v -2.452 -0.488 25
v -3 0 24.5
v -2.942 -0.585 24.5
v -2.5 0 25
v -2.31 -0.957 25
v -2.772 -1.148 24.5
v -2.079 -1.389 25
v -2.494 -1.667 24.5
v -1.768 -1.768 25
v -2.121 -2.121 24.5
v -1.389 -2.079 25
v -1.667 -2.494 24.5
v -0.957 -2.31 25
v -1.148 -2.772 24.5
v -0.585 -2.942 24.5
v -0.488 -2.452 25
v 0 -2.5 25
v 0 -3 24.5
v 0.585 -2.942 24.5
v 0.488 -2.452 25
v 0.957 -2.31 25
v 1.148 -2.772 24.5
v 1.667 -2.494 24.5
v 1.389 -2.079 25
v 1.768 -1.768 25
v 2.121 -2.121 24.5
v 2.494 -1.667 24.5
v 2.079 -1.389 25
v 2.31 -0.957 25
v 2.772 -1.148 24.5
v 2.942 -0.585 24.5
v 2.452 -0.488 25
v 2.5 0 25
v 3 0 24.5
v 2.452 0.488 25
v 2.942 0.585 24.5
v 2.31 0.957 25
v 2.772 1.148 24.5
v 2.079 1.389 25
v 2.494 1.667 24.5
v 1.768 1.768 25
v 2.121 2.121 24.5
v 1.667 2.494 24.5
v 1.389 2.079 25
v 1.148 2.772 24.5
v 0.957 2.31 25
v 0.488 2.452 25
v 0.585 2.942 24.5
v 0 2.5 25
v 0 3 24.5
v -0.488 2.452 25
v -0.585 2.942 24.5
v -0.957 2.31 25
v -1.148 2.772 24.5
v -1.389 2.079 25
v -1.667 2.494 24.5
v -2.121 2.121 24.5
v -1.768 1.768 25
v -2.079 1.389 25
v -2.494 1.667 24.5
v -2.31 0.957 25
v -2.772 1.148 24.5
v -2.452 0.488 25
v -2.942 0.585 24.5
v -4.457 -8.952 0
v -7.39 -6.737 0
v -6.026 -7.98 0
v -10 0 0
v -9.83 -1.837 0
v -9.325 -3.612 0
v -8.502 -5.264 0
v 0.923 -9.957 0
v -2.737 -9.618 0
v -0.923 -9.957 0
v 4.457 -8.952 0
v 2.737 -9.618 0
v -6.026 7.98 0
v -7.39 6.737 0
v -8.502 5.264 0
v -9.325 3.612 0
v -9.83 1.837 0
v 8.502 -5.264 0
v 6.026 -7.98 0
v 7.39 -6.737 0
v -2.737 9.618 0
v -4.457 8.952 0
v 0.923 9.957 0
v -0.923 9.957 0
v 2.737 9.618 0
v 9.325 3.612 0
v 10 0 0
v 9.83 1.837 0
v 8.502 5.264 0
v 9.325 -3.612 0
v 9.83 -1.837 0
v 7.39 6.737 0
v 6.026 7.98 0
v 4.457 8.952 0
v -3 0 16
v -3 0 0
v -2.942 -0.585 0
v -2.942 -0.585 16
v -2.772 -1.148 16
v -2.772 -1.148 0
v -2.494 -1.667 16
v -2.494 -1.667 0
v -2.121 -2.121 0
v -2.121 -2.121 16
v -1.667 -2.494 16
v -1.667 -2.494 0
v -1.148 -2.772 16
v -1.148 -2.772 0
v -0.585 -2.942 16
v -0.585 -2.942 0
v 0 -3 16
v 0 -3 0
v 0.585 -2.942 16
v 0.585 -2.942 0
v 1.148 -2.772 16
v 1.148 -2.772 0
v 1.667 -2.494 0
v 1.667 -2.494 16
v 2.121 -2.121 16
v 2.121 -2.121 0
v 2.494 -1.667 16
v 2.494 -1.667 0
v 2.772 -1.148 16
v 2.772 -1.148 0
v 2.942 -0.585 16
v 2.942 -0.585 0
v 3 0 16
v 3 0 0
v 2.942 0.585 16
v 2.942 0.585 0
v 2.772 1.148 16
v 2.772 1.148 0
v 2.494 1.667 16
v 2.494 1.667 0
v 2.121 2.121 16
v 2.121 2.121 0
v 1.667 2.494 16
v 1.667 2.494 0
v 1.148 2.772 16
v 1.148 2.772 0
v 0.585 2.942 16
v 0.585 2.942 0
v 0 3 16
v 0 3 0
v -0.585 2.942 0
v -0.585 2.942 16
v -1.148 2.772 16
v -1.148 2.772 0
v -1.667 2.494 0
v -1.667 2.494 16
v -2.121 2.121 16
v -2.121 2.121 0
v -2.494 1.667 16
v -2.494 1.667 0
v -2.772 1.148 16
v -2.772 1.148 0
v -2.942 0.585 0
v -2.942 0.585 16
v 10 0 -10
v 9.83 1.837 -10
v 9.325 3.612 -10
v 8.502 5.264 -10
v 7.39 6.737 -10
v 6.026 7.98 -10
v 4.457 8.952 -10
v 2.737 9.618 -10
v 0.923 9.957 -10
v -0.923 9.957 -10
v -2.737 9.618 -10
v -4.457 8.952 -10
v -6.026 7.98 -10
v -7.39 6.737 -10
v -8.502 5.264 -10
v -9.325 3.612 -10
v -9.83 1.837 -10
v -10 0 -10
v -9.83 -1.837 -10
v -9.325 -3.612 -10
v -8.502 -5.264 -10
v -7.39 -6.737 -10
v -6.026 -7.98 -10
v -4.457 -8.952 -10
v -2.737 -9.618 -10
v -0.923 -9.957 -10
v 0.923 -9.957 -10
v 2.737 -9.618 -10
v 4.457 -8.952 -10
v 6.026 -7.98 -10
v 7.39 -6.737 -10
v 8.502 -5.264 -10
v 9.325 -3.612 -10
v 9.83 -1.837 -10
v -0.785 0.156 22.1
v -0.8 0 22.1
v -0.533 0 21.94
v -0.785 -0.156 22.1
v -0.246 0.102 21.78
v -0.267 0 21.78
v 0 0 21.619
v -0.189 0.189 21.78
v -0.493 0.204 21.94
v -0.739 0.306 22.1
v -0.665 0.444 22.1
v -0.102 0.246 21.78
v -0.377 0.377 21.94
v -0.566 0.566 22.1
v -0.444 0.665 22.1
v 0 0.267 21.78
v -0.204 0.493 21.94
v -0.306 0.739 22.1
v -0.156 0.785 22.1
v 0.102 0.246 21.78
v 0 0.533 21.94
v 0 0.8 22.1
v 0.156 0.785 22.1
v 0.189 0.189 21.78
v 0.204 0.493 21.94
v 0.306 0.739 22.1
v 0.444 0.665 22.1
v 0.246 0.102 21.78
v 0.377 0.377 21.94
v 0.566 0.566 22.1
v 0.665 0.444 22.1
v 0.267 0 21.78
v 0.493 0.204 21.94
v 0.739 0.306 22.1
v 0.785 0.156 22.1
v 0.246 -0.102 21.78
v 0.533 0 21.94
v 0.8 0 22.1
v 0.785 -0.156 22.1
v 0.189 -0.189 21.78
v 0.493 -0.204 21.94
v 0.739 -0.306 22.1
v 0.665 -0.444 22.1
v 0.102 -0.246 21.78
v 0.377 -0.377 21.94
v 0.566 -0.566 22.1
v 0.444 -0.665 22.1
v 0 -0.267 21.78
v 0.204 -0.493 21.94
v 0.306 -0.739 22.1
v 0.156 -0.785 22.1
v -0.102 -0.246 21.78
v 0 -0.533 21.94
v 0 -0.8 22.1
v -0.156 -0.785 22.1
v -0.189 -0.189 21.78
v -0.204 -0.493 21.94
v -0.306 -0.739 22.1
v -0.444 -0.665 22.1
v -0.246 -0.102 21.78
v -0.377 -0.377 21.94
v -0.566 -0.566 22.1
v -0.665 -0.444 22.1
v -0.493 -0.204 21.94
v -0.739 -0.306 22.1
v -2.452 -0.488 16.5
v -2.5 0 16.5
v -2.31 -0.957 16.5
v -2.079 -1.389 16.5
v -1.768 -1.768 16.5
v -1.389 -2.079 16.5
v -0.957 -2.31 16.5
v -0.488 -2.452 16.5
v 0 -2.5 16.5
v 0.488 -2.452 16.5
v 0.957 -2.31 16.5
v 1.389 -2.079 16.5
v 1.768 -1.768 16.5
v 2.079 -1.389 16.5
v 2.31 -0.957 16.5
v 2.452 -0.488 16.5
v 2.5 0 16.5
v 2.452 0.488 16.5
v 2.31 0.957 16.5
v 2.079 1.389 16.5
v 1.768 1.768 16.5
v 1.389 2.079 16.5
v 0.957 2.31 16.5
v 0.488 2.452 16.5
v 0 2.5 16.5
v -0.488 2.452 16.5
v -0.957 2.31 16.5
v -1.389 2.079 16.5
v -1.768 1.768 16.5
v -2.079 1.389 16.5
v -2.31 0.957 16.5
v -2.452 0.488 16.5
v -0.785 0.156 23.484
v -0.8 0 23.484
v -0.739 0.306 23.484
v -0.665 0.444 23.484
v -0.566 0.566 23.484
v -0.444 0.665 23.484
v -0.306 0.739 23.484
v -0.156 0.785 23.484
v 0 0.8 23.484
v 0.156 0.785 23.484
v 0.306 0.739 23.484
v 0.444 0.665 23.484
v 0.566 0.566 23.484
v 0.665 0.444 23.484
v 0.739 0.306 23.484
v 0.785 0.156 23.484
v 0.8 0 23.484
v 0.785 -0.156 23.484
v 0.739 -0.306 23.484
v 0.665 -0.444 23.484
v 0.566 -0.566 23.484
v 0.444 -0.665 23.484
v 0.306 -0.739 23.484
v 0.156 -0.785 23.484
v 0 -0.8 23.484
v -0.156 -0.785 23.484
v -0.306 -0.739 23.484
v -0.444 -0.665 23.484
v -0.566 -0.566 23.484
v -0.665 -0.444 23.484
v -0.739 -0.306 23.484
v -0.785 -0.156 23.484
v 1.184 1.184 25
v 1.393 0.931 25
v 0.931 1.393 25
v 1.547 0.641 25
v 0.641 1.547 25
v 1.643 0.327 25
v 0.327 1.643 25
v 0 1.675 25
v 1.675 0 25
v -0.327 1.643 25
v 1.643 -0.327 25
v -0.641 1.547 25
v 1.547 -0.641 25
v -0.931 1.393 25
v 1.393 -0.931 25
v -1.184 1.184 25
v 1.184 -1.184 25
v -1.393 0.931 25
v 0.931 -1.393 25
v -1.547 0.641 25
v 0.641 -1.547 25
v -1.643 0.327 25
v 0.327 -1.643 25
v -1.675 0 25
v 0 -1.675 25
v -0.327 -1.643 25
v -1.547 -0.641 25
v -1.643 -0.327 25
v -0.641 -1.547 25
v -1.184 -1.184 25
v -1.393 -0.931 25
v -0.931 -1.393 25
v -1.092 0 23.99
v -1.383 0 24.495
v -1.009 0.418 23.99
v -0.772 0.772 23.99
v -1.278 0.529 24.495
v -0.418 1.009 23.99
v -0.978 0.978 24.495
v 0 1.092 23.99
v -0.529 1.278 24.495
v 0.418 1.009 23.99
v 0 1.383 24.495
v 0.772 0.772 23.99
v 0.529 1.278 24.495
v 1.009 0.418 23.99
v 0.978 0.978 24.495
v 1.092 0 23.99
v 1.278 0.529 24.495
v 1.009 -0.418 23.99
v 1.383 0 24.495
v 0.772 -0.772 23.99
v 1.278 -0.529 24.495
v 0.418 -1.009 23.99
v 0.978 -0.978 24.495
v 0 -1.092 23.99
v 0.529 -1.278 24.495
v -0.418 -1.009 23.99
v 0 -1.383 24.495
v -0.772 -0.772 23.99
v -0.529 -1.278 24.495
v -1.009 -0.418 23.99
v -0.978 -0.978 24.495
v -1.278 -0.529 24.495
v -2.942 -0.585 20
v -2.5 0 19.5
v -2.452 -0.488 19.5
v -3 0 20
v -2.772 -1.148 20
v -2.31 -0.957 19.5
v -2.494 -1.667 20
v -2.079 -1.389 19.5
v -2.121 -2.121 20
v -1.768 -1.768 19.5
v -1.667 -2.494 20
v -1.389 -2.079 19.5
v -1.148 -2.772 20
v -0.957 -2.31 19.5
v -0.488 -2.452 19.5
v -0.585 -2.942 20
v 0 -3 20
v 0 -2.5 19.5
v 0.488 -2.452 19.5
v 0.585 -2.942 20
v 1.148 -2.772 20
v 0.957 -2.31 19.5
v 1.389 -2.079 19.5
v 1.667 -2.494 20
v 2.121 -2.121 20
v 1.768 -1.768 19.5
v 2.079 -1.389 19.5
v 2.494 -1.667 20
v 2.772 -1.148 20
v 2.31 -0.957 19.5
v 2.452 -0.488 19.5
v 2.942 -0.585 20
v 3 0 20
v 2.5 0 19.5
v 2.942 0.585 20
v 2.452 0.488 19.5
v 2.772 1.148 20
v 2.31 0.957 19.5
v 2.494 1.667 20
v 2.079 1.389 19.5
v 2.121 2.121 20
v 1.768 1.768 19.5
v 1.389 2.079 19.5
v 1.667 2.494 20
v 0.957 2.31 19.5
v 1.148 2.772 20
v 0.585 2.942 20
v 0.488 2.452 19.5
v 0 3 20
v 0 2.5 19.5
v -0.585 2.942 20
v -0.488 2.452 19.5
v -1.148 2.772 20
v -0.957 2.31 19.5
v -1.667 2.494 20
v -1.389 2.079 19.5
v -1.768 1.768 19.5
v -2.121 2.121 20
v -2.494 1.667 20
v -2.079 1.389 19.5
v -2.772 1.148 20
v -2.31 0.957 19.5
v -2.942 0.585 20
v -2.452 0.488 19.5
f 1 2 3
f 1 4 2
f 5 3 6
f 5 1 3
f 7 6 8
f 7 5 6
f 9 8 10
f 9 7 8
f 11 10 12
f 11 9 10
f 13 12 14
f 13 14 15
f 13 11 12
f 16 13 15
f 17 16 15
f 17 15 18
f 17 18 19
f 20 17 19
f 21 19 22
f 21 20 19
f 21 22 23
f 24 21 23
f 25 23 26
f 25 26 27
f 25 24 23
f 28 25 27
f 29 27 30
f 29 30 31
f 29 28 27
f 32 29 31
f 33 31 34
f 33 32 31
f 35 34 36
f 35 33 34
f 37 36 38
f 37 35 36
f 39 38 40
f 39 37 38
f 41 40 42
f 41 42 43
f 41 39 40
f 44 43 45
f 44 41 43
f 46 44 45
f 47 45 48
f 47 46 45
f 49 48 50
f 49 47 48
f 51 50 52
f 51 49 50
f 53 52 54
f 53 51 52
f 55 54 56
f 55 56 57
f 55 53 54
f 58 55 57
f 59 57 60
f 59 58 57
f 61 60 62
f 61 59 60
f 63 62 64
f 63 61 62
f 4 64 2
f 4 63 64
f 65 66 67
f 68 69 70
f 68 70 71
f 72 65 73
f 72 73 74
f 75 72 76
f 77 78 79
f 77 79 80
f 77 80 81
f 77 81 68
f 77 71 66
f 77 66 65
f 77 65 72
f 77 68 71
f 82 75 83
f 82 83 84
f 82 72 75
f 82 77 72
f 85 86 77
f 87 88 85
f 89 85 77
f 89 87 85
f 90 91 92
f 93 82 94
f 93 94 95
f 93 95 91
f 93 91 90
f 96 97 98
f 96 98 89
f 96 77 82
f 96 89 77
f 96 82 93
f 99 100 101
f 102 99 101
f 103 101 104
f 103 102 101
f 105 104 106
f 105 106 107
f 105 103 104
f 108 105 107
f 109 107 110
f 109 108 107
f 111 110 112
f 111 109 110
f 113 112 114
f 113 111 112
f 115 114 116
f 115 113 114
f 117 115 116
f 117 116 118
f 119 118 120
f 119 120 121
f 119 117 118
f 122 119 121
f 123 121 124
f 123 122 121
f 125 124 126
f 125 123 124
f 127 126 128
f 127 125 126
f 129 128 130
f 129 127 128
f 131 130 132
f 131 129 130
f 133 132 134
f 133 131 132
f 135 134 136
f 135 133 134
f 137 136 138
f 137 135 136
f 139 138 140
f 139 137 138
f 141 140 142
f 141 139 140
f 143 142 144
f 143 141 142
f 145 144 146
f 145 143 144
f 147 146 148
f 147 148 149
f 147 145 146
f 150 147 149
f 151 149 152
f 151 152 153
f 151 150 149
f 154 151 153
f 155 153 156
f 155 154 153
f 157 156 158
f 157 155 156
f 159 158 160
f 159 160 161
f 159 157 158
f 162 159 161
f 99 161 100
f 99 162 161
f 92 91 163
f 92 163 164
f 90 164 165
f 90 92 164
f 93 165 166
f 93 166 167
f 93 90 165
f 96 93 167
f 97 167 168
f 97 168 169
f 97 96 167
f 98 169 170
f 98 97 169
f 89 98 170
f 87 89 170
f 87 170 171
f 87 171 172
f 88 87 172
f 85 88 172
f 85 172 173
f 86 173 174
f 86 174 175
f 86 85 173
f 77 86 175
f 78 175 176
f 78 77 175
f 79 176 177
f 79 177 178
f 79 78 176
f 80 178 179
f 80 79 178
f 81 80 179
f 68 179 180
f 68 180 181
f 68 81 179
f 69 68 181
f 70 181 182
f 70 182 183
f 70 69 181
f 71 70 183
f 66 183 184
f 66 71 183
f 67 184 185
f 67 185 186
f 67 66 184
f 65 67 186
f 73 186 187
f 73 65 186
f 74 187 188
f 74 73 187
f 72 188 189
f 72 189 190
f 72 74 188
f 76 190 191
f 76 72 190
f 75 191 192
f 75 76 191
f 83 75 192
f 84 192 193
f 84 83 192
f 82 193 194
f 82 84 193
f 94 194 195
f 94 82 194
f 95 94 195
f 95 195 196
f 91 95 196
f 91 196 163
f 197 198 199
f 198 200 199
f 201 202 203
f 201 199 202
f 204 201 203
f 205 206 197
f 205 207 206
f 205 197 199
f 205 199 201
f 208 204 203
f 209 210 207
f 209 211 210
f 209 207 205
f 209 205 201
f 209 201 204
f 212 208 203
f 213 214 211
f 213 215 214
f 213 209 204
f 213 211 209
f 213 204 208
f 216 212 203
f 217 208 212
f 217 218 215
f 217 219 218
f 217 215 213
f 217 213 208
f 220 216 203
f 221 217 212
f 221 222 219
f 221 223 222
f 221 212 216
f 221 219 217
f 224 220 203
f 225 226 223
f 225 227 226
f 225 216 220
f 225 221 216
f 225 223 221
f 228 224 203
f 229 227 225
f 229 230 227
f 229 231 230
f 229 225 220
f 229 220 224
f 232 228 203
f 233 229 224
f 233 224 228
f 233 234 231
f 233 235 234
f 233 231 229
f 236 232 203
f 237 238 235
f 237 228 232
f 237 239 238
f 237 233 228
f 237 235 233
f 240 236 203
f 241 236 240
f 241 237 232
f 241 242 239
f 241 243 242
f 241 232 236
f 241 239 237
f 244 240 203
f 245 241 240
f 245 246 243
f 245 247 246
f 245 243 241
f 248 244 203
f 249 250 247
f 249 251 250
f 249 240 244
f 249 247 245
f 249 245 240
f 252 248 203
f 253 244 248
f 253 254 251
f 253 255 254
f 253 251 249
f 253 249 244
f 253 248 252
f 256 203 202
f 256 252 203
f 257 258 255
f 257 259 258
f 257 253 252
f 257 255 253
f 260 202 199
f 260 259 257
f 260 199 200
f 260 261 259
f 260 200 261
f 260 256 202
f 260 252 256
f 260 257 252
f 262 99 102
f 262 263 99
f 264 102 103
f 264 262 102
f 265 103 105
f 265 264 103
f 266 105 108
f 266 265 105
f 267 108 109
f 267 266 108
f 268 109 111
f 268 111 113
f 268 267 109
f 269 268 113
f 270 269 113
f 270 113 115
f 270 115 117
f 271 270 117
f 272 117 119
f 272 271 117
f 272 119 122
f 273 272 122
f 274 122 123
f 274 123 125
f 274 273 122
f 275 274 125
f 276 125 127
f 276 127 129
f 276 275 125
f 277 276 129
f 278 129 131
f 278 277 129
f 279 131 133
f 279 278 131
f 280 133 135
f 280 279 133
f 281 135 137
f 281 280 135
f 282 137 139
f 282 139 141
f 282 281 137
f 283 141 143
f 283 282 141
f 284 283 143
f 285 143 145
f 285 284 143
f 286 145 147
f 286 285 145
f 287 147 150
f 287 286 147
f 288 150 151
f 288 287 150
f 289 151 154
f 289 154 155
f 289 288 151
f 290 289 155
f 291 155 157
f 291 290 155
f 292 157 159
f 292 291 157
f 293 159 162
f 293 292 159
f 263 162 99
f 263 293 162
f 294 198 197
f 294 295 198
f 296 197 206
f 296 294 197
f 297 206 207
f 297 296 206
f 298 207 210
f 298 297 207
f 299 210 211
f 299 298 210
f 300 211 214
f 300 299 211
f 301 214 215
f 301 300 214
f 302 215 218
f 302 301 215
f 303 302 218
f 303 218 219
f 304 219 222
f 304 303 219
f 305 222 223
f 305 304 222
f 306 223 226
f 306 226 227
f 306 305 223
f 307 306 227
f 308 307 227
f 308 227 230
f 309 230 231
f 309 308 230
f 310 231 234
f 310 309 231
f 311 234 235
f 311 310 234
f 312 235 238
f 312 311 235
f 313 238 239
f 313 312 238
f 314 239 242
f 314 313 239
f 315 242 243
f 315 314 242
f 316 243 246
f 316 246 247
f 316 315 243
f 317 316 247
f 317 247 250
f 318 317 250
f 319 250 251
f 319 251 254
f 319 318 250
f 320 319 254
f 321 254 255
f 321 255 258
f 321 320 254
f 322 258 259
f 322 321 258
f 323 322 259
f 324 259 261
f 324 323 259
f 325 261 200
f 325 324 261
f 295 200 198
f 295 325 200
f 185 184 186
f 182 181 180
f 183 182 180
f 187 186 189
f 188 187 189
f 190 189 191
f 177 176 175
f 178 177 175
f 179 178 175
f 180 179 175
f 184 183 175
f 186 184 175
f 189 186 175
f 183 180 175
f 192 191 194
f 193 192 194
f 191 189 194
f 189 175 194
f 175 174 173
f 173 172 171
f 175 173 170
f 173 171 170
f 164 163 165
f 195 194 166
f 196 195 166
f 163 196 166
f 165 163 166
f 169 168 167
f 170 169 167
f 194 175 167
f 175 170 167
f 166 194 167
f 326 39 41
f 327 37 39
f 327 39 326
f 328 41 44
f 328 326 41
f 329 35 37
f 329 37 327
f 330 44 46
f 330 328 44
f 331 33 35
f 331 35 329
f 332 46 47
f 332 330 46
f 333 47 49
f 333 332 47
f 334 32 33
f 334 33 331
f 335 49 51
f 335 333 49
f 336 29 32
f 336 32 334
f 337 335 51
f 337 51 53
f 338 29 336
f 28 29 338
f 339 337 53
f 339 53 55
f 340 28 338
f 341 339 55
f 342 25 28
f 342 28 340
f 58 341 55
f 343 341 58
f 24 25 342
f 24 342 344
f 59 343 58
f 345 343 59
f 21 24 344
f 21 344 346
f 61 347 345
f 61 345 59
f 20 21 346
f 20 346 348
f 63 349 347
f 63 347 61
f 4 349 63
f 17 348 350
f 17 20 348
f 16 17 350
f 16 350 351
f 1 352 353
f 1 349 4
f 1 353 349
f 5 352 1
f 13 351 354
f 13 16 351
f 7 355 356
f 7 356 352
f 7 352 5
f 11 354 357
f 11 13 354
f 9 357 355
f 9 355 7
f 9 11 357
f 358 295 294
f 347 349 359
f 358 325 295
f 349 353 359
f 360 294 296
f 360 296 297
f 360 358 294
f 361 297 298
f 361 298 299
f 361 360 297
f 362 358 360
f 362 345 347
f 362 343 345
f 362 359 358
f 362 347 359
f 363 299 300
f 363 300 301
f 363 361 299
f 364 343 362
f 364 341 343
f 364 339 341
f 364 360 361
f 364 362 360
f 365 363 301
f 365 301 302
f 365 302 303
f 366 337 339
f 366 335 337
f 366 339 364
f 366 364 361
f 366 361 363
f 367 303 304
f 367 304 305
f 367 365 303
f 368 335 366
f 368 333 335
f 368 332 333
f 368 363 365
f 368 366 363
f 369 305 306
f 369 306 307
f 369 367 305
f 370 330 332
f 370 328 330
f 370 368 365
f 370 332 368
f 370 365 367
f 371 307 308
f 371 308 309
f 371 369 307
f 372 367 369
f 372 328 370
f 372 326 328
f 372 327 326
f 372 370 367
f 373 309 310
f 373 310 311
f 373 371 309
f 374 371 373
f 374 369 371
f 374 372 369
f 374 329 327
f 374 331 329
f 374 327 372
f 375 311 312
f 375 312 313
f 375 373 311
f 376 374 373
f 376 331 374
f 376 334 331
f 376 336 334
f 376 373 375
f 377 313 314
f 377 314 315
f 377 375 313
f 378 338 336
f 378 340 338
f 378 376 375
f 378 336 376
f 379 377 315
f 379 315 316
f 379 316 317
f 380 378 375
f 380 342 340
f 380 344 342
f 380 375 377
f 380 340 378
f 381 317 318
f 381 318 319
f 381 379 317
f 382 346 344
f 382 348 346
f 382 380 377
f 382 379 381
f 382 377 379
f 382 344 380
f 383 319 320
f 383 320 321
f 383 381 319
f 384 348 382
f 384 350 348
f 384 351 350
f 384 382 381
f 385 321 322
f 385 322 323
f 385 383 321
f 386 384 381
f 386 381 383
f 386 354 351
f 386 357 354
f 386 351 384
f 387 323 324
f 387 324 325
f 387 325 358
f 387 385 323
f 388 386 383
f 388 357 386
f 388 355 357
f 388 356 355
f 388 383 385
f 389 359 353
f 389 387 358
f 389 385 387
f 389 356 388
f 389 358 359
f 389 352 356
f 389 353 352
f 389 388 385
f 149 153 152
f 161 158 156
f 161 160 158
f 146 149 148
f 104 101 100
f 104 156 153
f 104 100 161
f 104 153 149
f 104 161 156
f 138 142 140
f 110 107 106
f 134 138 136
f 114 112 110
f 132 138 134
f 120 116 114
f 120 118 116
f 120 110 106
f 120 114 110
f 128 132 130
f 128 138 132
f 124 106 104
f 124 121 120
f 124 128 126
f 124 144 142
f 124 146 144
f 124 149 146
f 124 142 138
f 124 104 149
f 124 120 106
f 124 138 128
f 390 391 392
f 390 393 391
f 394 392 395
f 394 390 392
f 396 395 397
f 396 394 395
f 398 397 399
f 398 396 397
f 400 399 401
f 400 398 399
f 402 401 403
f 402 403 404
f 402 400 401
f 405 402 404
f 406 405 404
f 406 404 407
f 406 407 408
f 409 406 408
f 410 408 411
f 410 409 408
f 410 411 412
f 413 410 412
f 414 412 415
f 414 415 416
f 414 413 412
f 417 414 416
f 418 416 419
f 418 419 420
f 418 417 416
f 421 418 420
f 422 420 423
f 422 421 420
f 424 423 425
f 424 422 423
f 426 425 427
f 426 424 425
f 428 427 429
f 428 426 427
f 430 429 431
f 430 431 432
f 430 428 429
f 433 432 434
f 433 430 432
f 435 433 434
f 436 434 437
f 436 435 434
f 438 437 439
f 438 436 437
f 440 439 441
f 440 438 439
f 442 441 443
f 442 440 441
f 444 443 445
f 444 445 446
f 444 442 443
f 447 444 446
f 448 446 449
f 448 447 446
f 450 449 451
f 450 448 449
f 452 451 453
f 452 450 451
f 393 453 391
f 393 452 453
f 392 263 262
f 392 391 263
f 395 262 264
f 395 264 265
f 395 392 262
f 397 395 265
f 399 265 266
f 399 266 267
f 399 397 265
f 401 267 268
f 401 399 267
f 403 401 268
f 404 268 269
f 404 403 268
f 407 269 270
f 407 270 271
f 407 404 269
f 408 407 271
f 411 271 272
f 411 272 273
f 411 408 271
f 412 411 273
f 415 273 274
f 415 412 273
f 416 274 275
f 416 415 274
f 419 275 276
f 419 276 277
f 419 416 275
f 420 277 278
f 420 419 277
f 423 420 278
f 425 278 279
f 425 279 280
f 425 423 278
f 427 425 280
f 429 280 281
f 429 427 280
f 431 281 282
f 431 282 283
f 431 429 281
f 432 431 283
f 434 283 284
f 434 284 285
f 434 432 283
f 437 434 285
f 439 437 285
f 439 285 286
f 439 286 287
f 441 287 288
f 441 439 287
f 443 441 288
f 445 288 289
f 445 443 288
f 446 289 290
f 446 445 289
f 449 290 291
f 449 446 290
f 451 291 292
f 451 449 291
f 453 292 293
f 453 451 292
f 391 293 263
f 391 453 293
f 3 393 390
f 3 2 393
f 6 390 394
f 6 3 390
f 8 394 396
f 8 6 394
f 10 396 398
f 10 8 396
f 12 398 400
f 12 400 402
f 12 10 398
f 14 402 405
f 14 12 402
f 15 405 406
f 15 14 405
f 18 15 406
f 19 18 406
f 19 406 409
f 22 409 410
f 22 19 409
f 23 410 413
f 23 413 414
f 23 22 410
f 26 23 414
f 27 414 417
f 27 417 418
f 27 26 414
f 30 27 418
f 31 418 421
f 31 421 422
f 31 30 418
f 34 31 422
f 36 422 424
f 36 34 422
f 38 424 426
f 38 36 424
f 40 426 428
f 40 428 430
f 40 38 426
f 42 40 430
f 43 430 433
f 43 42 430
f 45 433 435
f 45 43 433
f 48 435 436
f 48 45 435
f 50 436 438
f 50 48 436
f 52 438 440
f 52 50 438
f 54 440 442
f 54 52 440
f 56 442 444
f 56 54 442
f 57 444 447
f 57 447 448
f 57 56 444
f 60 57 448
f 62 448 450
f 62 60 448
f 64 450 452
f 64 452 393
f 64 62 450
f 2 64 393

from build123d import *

# Parameters (mm, degrees)
SKIZZE1_R                                     = 10
AUFSATZ_LINEAR_BASIS_KANN_UNTERSCHIEDLI_DEPTH = 10


with BuildPart() as part:
    # Skizze1 → Aufsatz-Linear Basis (Kann unterschiedliche Formen haben) (new body)
    with BuildSketch(Plane.XY):
        Circle(SKIZZE1_R)
    extrude(amount=-AUFSATZ_LINEAR_BASIS_KANN_UNTERSCHIEDLI_DEPTH)


with BuildPart() as body_2:
    # Skizze2 → Lehrengriffstück (revolve)
    with BuildSketch(Plane(origin=(0, 0, 0), x_dir=(0, 0, -1), z_dir=(1, 0, 0)), mode=Mode.PRIVATE) as lehrengriffst_ck_sk:
        Polygon((0, 0), (0, 3), (-16, 3), (-16.5, 2.5), (-19.5, 2.5), (-20, 3), (-24.5, 3), (-25, 2.5), (-25, 0), align=None)
    revolve(lehrengriffst_ck_sk.sketch.rotate(Axis((0, 0, -0.937789373), (0, 0, 1)), 90), axis=Axis((0, 0, -0.937789373), (0, 0, 1)))  # turned: the seam where the file's is

    # Skizze3 → Schnitt-Rotation1 (revolve, cut)
    with BuildSketch(Plane(origin=(0, 0, 25), x_dir=(1, 0, 0), z_dir=(0, -1, 0)), mode=Mode.PRIVATE) as schnitt_rotation1_sk:
        Polygon((0, -3.380688495), (0.8, -2.9), (0.8, -1.515544457), (1.675, 0), (0, 0), align=None)
    revolve(schnitt_rotation1_sk.sketch.rotate(Axis((0, 0, 25), (0, 0, -1)), 180), axis=Axis((0, 0, 25), (0, 0, -1)), mode=Mode.SUBTRACT)  # turned: the seam where the file's is


solid = Compound([part.part, body_2.part])
